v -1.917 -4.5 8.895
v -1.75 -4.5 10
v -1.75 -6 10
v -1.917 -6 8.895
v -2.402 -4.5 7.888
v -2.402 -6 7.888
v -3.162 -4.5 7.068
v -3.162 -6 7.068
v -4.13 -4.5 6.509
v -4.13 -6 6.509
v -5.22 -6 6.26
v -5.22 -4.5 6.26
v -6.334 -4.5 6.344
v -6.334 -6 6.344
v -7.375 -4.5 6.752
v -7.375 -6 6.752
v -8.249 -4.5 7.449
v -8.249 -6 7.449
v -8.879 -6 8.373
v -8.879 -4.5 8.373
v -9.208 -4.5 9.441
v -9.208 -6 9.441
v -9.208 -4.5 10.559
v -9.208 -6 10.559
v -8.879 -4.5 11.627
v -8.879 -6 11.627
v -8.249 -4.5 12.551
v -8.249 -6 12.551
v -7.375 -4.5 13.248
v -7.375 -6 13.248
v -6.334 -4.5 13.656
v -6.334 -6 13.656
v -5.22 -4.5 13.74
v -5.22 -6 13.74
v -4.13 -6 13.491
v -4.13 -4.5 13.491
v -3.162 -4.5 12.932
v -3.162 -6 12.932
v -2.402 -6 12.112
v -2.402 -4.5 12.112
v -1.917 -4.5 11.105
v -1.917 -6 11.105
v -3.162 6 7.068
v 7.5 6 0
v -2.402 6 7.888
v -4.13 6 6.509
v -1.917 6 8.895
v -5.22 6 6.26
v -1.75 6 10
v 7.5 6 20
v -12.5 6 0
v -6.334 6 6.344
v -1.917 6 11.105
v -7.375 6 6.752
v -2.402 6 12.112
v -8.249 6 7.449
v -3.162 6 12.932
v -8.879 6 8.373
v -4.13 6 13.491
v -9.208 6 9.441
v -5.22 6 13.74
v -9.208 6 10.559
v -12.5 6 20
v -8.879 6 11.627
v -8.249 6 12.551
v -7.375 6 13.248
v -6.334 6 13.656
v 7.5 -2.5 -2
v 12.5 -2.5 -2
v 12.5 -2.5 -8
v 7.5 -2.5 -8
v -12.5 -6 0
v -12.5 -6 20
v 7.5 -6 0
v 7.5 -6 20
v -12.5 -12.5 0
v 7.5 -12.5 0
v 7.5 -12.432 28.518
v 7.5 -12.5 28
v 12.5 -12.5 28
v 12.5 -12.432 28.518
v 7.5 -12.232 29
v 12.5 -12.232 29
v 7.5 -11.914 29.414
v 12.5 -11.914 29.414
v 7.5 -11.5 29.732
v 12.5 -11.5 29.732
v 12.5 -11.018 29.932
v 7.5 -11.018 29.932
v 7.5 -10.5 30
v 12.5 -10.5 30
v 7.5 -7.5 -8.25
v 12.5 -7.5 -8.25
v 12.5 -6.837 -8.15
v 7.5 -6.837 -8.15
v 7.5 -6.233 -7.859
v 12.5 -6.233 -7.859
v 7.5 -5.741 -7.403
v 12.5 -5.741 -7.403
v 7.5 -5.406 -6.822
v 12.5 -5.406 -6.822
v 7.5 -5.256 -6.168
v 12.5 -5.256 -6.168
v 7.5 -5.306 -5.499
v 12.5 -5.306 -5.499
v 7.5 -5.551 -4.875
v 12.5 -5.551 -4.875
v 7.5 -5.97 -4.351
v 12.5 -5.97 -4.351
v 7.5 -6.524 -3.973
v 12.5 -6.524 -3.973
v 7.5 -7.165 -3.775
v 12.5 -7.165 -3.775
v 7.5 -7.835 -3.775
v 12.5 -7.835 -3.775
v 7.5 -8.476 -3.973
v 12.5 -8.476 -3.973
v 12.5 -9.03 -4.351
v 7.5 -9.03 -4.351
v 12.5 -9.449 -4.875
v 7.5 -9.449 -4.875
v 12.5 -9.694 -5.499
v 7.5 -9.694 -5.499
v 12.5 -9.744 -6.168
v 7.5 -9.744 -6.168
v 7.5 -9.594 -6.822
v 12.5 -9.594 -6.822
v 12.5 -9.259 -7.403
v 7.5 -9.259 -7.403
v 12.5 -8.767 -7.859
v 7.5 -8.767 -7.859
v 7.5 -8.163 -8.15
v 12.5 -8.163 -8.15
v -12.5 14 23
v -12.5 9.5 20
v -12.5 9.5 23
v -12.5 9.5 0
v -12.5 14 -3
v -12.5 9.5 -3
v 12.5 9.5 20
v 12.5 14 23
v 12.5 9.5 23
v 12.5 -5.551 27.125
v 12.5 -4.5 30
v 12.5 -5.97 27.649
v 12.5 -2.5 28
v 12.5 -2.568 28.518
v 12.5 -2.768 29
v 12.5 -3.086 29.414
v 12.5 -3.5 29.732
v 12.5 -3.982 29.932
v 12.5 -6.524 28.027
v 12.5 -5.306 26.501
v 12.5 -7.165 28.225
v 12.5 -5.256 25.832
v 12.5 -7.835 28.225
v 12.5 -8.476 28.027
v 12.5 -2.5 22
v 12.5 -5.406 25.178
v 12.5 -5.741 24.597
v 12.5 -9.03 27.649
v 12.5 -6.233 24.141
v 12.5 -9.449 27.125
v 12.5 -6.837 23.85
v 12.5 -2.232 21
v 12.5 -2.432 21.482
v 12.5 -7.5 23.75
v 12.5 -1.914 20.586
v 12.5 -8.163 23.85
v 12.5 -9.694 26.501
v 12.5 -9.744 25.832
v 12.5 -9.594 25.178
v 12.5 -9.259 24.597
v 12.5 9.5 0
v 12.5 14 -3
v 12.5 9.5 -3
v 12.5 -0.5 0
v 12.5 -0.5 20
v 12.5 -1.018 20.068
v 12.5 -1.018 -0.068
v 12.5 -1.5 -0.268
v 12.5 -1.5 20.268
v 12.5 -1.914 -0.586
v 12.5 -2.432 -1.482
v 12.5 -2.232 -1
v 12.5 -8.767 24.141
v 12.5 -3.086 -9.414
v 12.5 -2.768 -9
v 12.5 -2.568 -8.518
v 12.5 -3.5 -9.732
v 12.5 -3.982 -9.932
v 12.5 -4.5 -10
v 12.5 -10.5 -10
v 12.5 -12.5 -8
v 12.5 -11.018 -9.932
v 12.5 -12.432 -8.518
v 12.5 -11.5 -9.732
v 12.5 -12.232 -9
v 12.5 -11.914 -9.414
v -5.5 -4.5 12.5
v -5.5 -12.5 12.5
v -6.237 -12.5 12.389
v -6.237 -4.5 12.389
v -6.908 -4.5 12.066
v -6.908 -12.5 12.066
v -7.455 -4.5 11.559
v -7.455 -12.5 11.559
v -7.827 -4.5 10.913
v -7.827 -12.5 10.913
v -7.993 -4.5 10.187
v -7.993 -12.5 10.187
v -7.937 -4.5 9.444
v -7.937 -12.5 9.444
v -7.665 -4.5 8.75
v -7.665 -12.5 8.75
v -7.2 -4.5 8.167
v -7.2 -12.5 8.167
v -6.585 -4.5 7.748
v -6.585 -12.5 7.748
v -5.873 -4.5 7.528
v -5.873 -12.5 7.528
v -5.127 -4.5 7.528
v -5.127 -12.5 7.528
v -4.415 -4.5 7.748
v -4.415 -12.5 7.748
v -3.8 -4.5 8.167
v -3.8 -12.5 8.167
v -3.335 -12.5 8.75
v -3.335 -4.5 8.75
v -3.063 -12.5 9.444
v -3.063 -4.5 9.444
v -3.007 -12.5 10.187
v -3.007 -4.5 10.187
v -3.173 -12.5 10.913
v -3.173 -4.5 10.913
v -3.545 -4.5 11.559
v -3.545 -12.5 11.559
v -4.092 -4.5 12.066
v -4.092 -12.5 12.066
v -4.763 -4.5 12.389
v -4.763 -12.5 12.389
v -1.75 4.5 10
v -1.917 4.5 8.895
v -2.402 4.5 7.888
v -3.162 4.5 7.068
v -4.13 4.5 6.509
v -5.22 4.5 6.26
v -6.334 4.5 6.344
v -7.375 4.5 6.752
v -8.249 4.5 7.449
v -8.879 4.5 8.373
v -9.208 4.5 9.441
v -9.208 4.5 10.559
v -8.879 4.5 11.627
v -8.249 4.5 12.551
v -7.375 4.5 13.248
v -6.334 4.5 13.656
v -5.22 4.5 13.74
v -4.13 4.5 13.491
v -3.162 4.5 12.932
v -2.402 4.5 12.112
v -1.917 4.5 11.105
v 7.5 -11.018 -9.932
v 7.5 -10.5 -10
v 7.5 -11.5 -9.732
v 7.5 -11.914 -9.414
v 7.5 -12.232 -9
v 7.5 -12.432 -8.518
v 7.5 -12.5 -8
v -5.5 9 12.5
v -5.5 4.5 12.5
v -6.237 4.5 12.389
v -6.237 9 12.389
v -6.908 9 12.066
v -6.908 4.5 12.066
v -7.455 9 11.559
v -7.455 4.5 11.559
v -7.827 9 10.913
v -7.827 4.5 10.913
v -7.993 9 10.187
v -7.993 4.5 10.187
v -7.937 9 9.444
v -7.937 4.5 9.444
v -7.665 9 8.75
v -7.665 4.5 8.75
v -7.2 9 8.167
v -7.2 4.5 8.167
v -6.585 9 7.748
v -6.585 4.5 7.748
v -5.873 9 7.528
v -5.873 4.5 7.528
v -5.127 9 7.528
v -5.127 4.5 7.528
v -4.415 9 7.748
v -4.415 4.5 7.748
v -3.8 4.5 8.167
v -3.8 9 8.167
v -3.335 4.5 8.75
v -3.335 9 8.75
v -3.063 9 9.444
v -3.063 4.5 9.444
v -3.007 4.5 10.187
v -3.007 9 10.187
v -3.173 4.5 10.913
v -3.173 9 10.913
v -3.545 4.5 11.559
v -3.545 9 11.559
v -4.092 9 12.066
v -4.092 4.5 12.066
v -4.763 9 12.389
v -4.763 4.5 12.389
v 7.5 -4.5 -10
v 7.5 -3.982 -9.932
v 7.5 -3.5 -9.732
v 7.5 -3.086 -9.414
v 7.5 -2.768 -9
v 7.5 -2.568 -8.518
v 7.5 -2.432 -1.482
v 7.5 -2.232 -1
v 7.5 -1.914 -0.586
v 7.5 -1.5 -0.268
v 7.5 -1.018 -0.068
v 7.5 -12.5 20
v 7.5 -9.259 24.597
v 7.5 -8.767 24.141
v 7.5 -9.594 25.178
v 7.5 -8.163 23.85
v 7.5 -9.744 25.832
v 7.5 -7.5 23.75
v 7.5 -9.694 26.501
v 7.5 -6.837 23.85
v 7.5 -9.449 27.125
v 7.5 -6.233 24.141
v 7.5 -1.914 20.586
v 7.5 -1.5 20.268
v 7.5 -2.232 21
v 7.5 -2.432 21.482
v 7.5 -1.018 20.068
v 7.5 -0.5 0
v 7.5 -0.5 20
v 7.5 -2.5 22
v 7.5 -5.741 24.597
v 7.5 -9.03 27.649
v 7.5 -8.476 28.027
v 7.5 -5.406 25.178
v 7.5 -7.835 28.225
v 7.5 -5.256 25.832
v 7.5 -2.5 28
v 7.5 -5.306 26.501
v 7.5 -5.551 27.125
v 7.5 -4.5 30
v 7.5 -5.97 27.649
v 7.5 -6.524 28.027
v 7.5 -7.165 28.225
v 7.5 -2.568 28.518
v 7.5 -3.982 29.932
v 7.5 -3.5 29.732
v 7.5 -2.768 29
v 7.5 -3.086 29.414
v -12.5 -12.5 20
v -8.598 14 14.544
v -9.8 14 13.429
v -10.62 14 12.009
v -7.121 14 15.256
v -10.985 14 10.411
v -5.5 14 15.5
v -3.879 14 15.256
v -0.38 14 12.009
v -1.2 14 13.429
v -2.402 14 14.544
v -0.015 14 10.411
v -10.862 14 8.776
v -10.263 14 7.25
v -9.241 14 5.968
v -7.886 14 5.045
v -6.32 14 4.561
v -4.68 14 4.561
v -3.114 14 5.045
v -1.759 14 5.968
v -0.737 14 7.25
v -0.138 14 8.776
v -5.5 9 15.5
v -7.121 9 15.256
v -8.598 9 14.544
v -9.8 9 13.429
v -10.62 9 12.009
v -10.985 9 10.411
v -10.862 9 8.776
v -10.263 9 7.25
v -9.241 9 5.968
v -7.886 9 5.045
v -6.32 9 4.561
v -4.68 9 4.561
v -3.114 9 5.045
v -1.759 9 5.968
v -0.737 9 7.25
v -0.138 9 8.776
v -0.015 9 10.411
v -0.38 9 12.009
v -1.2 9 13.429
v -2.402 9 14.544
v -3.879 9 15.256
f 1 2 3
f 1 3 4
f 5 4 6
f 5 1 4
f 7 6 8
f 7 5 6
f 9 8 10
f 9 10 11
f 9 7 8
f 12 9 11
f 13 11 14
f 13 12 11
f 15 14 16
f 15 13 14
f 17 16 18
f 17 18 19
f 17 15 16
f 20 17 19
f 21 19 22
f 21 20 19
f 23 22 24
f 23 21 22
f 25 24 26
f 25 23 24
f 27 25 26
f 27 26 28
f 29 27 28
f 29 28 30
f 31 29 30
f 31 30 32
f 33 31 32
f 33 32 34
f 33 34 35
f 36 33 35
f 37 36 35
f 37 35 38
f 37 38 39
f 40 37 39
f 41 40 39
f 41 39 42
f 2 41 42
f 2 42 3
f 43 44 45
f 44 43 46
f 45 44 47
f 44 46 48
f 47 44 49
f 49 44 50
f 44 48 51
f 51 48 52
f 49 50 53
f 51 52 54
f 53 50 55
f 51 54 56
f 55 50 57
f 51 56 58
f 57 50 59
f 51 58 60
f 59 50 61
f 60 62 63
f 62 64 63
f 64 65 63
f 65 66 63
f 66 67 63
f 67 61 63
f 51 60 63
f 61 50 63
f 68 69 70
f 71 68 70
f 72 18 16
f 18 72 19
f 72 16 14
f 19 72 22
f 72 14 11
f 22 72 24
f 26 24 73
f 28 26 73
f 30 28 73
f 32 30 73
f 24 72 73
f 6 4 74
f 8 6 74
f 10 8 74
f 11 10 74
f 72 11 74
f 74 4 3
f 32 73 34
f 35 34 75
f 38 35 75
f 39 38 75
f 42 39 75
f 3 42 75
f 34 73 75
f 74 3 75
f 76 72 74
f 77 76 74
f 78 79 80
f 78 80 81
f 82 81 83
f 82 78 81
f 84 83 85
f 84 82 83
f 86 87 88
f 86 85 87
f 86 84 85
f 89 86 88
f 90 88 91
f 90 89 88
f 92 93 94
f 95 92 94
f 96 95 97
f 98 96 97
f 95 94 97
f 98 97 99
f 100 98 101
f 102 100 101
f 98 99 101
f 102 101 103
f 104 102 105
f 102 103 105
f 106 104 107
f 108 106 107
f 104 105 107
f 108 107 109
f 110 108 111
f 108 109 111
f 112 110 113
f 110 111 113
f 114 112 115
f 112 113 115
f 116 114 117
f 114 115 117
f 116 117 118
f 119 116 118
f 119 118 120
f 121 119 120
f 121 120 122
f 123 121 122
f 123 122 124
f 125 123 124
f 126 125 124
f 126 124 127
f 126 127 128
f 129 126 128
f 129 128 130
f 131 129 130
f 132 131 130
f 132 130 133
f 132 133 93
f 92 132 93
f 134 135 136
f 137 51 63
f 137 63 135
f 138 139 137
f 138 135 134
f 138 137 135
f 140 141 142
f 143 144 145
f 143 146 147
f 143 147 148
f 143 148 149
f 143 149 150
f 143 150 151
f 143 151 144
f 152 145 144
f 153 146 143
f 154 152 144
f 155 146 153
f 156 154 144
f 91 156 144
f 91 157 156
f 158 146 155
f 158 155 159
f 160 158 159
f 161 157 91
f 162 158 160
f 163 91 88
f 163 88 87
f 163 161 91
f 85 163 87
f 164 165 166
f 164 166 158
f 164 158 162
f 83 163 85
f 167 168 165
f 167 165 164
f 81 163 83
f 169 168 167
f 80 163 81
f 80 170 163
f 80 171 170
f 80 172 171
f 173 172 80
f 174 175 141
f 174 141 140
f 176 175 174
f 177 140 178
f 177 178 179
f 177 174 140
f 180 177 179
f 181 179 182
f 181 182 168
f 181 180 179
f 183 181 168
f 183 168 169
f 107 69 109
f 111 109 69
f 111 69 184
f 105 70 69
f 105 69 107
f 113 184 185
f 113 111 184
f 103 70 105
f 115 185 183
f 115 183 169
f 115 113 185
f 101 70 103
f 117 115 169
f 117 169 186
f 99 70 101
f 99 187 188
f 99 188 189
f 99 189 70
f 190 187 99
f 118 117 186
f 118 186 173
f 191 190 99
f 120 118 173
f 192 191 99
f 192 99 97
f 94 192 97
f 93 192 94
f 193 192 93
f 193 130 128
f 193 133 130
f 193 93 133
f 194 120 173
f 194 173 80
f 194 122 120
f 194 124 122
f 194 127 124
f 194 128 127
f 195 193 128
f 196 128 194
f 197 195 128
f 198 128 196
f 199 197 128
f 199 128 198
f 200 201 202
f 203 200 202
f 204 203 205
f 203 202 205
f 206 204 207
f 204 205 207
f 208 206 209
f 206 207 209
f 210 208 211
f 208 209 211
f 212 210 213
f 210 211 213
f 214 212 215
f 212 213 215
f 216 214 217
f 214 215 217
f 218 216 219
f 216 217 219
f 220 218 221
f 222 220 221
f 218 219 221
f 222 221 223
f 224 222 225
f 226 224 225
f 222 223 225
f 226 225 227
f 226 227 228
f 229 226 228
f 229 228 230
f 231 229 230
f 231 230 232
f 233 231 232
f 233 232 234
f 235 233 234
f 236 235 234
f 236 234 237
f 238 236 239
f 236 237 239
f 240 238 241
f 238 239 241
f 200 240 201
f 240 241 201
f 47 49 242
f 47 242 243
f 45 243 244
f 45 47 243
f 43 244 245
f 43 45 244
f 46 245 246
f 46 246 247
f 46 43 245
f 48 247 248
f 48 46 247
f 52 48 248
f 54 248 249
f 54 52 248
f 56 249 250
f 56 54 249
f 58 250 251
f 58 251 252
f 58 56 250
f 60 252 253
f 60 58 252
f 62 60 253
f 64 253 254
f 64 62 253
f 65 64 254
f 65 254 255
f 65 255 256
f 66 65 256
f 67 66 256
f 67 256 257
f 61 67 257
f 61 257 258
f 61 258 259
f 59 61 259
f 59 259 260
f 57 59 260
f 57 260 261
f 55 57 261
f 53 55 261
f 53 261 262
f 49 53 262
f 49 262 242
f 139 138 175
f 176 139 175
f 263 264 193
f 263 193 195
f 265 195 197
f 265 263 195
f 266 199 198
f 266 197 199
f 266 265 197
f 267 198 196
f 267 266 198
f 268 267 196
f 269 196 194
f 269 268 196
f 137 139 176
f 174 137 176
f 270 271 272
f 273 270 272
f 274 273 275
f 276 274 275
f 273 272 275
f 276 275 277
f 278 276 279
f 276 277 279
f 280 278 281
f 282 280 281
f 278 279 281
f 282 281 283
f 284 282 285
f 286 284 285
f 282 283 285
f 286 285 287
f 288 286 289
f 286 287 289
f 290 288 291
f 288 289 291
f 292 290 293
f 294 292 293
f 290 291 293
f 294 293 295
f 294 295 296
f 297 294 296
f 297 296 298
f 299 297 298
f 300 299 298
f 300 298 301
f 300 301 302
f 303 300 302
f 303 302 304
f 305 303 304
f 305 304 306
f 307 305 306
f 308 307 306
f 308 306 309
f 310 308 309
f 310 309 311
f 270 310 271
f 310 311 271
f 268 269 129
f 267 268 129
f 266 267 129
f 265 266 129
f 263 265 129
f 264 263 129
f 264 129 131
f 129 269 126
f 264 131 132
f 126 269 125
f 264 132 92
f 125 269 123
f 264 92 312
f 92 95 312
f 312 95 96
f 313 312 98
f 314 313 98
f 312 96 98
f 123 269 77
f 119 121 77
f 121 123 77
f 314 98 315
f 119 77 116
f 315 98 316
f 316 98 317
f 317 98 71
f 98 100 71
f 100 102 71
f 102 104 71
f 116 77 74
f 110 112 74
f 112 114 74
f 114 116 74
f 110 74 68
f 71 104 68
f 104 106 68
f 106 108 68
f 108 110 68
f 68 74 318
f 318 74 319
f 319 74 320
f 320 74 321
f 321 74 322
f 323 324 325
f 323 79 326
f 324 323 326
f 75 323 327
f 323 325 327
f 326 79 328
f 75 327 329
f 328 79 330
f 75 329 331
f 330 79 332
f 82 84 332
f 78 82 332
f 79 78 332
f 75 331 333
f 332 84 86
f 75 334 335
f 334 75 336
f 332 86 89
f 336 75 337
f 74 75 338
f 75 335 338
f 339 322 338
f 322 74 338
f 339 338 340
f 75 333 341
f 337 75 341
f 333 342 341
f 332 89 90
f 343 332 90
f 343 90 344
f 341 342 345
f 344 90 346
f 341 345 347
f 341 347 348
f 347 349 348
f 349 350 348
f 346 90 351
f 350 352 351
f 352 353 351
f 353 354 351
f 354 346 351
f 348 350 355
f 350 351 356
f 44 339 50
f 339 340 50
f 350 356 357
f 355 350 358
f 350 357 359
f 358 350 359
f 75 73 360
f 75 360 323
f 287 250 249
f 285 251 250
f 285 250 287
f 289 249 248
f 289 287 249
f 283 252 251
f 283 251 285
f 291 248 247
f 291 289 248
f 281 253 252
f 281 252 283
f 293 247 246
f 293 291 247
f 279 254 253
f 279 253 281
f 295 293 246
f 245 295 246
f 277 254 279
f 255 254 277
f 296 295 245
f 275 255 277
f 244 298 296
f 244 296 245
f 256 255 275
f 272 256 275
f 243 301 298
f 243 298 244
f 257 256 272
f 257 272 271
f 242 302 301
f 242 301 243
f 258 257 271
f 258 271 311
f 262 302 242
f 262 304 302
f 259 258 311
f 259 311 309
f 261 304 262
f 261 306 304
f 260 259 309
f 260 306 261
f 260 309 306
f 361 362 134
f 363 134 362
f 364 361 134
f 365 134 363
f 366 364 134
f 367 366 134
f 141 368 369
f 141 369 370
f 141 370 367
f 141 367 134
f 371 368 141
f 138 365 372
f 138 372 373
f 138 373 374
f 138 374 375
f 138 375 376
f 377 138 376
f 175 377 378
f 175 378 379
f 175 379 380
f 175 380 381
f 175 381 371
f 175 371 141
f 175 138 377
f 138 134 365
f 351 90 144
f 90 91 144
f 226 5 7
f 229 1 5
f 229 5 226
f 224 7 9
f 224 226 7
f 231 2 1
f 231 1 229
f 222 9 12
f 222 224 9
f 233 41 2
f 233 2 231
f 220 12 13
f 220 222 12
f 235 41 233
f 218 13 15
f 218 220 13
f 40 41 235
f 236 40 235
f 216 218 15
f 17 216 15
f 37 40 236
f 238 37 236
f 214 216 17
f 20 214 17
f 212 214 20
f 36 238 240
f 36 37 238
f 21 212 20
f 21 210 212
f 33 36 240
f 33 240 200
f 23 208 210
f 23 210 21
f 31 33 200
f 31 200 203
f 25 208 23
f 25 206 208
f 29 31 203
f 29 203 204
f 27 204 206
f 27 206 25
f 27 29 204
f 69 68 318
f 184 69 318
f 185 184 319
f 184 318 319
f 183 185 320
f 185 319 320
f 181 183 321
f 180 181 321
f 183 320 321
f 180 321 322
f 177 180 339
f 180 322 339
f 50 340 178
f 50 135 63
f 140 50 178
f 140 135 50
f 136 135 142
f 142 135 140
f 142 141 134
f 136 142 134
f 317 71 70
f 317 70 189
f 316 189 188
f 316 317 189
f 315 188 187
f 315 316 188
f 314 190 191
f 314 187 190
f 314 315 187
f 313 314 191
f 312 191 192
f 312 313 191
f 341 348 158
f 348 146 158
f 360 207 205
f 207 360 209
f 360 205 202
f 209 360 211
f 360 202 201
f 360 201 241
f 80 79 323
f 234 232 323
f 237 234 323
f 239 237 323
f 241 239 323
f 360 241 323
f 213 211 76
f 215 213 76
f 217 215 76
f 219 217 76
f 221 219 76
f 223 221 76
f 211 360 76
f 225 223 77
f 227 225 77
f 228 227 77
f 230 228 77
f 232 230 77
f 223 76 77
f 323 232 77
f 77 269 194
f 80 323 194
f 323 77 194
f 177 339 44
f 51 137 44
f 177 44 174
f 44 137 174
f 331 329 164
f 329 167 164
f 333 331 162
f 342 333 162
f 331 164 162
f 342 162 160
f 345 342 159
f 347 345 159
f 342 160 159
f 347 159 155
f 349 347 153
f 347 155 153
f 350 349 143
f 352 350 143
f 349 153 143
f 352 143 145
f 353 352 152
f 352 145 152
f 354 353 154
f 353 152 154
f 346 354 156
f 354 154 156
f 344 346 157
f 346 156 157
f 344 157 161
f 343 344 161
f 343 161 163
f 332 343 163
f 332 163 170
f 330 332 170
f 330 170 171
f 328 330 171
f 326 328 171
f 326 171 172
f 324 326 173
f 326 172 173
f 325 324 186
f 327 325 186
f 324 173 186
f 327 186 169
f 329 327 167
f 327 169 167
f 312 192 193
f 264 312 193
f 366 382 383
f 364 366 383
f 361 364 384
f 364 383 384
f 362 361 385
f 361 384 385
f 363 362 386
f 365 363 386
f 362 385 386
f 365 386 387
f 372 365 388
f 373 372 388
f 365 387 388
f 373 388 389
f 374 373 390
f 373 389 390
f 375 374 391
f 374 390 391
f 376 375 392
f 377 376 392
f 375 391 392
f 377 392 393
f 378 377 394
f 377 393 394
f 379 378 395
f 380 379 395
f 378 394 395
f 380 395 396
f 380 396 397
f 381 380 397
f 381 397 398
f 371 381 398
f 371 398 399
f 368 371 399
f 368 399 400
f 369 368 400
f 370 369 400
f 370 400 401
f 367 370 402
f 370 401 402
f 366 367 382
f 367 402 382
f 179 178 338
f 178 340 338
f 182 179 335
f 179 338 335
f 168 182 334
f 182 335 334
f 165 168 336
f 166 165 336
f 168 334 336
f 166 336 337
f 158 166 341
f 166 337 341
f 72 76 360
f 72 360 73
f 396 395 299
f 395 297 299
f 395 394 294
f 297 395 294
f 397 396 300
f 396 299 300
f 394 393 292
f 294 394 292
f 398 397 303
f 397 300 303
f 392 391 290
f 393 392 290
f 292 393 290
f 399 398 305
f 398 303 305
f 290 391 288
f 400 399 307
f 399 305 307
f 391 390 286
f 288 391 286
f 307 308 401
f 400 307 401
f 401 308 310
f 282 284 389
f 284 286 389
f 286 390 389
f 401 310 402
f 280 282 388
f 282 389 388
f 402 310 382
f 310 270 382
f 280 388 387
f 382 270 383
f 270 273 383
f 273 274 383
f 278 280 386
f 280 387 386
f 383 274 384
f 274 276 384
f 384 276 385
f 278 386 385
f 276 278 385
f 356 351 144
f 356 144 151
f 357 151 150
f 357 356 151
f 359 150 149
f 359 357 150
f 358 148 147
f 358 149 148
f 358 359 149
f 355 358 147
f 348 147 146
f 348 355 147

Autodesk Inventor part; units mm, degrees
ref_plane "YZ Plane" through (0, 0, 0) normal (1, 0, 0) x (0, 1, 0)
ref_plane "XZ Plane" through (0, 0, 0) normal (0, 1, 0) x (-1, 0, 0)
ref_plane "XY Plane" through (0, 0, 0) normal (0, 0, 1) x (1, 0, 0)
sketch "Sketch1" plane through (0, 0, 0) normal (0, 0, 1) x (1, 0, 0)
  line L0 (-12.5, 12.5) -> (12.5, 12.5)
  line L1 (12.5, 12.5) -> (12.5, -12.5)
  line L2 (12.5, -12.5) -> (-12.5, -12.5)
  line L3 (-12.5, -12.5) -> (-12.5, 12.5)
  point P0 (0, 0)
  point P1 (-12.5, 0)
  point P2 (0, 12.5)
  dimension "d0" = 25
  dimension "d1" = 25
extrude "Extrusion1" add sketch "Sketch1" along normal blind 20
sketch "Sketch2" plane through (0, 0, 20) normal (0, 0, 1) x (1, 0, 0)
  line L0 (-12.5, -6) -> (7.5, -6)
  line L1 (7.5, -6) -> (7.5, 6)
  line L2 (7.5, 6) -> (-12.5, 6)
  line L3 (-12.5, 6) -> (-12.5, -6)
  line L4 (-12.5, 12.5) -> (-12.5, -12.5) projected
  line L5 (12.5, -12.5) -> (12.5, 12.5) projected
  point P0 (0, 0)
  point P1 (7.5, 0)
  point P2 (12.5, 0)
  dimension "d4" = 12
  dimension "d5" = 5
extrude "Extrusion2" cut sketch "Sketch2" against normal through all
sketch "Sketch3" plane through (-12.5, -12.5, 0) normal (0, -1, 0) x (1, 0, 0)
  line L0 (0, 0) -> (0, 20) projected
  point P0 (12.5, 0)
  point P1 (7, 10)
  point P2 (0, 10)
  dimension "d8" = 7
hole "Hole1" at (-5.5, -12.5, 10) direction (0, 1, 0) diameter 5 end through all
sketch "Sketch4" plane through (-12.5, 12.5, 0) normal (0, 1, 0) x (1, 0, 0)
  line L0 (25, -23) -> (0, -23)
  line L1 (0, -23) -> (0, -20)
  line L2 (0, -20) -> (25, -20)
  line L3 (25, -20) -> (25, -23)
  line L4 (25, -20) -> (0, -20) projected
  line L5 (0, 0) -> (0, -20) projected
  line L6 (25, 0) -> (25, -20) projected
  line L7 (25, 0) -> (0, 0)
  line L8 (0, 0) -> (0, 3)
  line L9 (0, 3) -> (25, 3)
  line L10 (25, 3) -> (25, 0)
  line L11 (25, 0) -> (0, 0) projected
  point P0 (12.5, 0)
  dimension "d16" = 3
extrude "Extrusion3" add sketch "Sketch4" against normal blind 3 contours L0 L1 L2 L3 | L7 L8 L9 L10
sketch "Sketch7" plane through (12.5, -12.5, 20) normal (1, 0, 0) x (0, 0, -1)
  line L0 (-10, 0) -> (-10, 10)
  line L1 (-10, 10) -> (30, 10)
  line L2 (30, 10) -> (30, 0)
  line L3 (20, 0) -> (0, 0) projected
  line L4 (20, 0) -> (20, 22) projected
  line L5 (0, 0) -> (0, 22) projected
  circle A0 centre (26, 5) radius 2.25
  circle A1 centre (-6, 5) radius 2.25
  line L6 (20, 0) -> (0, 0) projected
  line L7 (-10, 0) -> (32.446, 0)
  point P0 (20, 12.5)
  point P1 (30, 5)
  point P2 (20, 10)
  point P3 (0, 10)
  point P4 (20, 0)
  point P5 (0, 0)
  dimension "d30" = 10
  dimension "d31" = 10
  dimension "d32" = 4.5
  dimension "d33" = 4
  dimension "d34" = 4
  dimension "d50" = 10
  dimension "d51" = 0
extrude "Extrusion5" add sketch "Sketch7" against normal up to surface (5 mm away) contours L0 L1 L5 L7 | L4 L1 L2 L7
sketch "Sketch6" plane through (-12.5, 12.5, 23) normal (0, 1, 0) x (1, 0, 0)
  circle A0 centre (7, 13) radius 2.5 projected
  circle A1 centre (7, 13) radius 1.5
  point P0 (12.5, 23)
  dimension "d26" = 3
extrude "Extrusion4" add sketch "Sketch6" against normal blind 2
sketch "Sketch8" plane through (-12.5, 12.5, 23) normal (0, 1, 0) x (1, 0, 0)
  circle A0 centre (7, 13) radius 1.5 projected
  circle A1 centre (7, 13) radius 3.75
  point P0 (12.5, 23)
  dimension "d37" = 7.5
extrude "Extrusion6" add sketch "Sketch8" against normal up to surface (25 mm away)
sketch "Sketch9" plane through (-12.5, 12.5, 23) normal (0, 0, 1) x (1, 0, 0)
  line L0 (0, -8) -> (20, -8)
  line L1 (20, -8) -> (20, -17)
  line L2 (20, -17) -> (0, -17)
  line L3 (0, -17) -> (0, -8)
  line L4 (0, -18.5) -> (0, -25) projected
  line L5 (20, -6.5) -> (20, -18.5) projected
  line L6 (0, -6.5) -> (20, -6.5) projected
  line L7 (20, -18.5) -> (0, -18.5) projected
  point P0 (12.5, -12.5)
  point P1 (20, -15)
  dimension "d40" = 1.5
  dimension "d41" = 1.5
extrude "Extrusion7" cut sketch "Sketch9" against normal through all
move faces "Move2" translate (0, 1.5, 0) faces at (7, 12.5, 10)
fillet "Fillet2" radius 2 6 edges at (10, -2.5, 20) (10, -2.5, 30) (10, -12.5, 30) (10, -12.5, -10) (10, -2.5, -10) (10, -2.5, 0)
sketch "Sketch11" plane through (-12.5, 14, 23) normal (0, 1, 0) x (1, 0, 0)
  circle A0 centre (7, 13) radius 1.5 projected
  point P0 (12.5, 23)
hole "Hole3" at (-5.5, 14, 10) direction (0, -1, 0) diameter 5 end through all counterbore diameter 11 counterbore depth 5
equation "\"d30\" = d31"
properties part number "10-03-024"
